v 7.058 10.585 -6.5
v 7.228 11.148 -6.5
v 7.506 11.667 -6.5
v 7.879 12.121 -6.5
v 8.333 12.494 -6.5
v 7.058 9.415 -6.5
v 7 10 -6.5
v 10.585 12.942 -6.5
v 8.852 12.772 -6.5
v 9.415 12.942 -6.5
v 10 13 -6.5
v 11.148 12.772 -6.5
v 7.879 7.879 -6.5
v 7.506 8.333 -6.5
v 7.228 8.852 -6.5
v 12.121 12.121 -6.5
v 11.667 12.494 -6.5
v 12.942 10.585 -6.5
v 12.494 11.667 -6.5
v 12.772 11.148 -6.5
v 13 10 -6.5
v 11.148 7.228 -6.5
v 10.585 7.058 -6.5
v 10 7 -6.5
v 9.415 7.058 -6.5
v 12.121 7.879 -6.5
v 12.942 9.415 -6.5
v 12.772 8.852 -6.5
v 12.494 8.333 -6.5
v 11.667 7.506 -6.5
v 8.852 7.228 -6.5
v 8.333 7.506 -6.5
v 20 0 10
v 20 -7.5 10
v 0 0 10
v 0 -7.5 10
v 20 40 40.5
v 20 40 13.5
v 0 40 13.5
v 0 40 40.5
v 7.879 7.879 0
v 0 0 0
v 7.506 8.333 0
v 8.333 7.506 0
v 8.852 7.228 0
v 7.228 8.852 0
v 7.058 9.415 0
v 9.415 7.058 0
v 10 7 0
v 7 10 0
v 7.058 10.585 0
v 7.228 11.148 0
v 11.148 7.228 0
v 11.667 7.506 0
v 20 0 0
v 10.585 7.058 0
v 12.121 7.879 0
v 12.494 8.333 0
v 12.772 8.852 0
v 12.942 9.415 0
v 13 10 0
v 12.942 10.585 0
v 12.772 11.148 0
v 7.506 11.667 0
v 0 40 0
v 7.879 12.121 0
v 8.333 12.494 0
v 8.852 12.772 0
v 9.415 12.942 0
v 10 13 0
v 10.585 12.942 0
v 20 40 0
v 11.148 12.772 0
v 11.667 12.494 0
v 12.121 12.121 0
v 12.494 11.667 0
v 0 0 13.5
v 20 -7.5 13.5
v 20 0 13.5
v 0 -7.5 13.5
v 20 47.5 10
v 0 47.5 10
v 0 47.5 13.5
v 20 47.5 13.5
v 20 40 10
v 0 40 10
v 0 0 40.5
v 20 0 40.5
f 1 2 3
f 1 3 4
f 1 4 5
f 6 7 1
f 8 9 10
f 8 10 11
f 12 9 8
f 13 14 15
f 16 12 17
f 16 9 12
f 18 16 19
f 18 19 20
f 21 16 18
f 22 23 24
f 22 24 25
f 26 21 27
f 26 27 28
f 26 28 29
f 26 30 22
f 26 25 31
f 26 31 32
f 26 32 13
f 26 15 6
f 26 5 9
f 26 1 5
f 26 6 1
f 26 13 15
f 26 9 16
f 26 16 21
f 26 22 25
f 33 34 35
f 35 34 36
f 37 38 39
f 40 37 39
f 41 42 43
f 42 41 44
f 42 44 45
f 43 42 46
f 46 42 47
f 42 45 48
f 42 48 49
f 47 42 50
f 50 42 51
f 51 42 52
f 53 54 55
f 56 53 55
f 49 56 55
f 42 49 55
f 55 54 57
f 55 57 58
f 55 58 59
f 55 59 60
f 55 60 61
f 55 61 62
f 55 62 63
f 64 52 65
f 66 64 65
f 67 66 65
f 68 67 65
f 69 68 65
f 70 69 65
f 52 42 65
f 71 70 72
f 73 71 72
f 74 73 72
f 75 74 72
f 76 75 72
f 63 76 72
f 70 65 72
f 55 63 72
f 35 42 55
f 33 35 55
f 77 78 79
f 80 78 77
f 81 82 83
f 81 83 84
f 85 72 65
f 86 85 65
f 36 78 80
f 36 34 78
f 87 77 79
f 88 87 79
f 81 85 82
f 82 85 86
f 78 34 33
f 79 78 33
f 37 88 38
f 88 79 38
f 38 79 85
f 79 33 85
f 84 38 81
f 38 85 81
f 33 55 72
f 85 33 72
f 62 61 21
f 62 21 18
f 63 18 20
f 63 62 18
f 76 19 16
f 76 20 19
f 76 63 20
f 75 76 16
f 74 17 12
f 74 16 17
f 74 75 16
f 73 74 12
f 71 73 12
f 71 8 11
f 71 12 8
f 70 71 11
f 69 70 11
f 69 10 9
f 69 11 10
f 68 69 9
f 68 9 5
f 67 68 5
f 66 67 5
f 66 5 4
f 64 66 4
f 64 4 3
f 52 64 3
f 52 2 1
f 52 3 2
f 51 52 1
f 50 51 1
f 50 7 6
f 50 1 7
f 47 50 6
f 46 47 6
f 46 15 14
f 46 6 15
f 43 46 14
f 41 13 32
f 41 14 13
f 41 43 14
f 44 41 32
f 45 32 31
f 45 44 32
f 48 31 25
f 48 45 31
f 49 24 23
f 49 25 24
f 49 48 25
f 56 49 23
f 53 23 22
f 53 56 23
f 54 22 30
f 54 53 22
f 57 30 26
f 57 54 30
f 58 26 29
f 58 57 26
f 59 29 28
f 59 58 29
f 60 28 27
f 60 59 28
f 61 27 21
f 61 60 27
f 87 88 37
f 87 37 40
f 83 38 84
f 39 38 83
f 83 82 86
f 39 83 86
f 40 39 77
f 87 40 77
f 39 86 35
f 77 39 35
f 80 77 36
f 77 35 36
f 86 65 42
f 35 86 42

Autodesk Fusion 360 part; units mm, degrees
sketch "スケッチ1" plane through (0, 0, 0) normal (0, 0, 1) x (1, 0, 0)
  line L0 (0, 0) -> (20, 0)
  line L1 (20, 0) -> (20, 40)
  line L2 (20, 40) -> (0, 40)
  line L3 (0, 40) -> (0, 0)
  dimension "d1" = 20
  dimension "d2" = 40
extrude "押し出し1" add sketch "スケッチ1" along normal blind 10
sketch "スケッチ2" plane through (0, 0, 10) normal (0, 0, 1) x (-1, 0, 0)
  line L0 (0, -40) -> (0, 0)
  line L1 (0, 0) -> (-20, 0)
  line L2 (-20, 0) -> (-20, -40)
  line L3 (-20, -40) -> (0, -40)
  line L4 (0, -47.5) -> (-20, -47.5)
  line L5 (-20, -47.5) -> (-20, 7.5)
  line L6 (-20, 7.5) -> (0, 7.5)
  line L7 (0, 7.5) -> (0, -47.5)
  dimension "d5" = 55
  dimension "d6" = 7.5
extrude "押し出し2" add sketch "スケッチ2" along normal blind 3.5
sketch "スケッチ3" plane through (0, 0, 13.5) normal (0, 0, 1) x (-1, 0, 0)
  line L0 (0, 7.5) -> (-20, 7.5)
  line L1 (-20, 7.5) -> (-20, -47.5)
  line L2 (-20, -47.5) -> (0, -47.5)
  line L3 (0, -47.5) -> (0, 7.5)
  line L4 (0, 0) -> (-20, 0)
  line L5 (-20, 0) -> (-20, -40)
  line L6 (-20, -40) -> (0, -40)
  line L7 (0, -40) -> (0, 0)
  dimension "d9" = 40
extrude "押し出し3" add sketch "スケッチ3" along normal blind 27 contours L1 L3 L4 L5 L6 L7
sketch "スケッチ4" plane through (0, 0, 0) normal (0, 0, -1) x (1, 0, 0)
  line L0 (0, 0) -> (0, -40)
  line L1 (0, -40) -> (20, -40)
  line L2 (20, -40) -> (20, 0)
  line L3 (20, 0) -> (0, 0)
  circle A0 centre (10, -10) radius 3
  dimension "d12" = 6
extrude "押し出し4" add sketch "スケッチ4" along normal blind 6.5 contours A0
